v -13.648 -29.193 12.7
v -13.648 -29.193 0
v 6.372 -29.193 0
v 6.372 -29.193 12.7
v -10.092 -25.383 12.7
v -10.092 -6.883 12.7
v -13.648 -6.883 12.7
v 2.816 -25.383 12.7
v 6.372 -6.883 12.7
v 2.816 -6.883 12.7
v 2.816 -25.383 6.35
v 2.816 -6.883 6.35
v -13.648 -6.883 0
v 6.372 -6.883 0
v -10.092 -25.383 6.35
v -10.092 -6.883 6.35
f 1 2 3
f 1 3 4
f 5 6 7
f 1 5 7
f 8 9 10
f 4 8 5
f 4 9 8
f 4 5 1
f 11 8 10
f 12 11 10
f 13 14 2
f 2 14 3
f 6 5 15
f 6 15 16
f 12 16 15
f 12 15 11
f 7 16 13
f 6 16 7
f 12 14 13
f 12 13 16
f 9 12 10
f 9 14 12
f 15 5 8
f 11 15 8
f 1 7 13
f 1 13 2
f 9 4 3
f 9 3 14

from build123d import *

# Parameters (mm, degrees)
F0_W     = 12.4
F0_H     = 18.5
F1_DEPTH = 6.35
F2_W     = 12.4
F2_H     = 12.7
F3_DEPTH = 3.81
F4_W     = 22.31
F4_H     = 12.7
F5_DEPTH = 3.81
F6_W     = 22.31
F6_H     = 12.7
F7_DEPTH = 3.81
F8_W     = 12.908
F8_H     = 18.5
F9_DEPTH = 6.35


with BuildPart() as f1:
    # F0 (on Top) → F1 (new body)
    with BuildSketch(Plane.XY):
        with Locations((-3.637616, -16.132845)):
            Rectangle(F0_W, F0_H)
    extrude(amount=F1_DEPTH)

    # F2 (on face) → F3 (join)
    with BuildSketch(Plane.XZ.offset(25.382845)):
        with Locations((-3.637616, 6.35)):
            Rectangle(F2_W, F2_H)
    extrude(amount=F3_DEPTH)

    # F4 (on face) → F5 (join)
    with BuildSketch(Plane.YZ.offset(2.562384)):
        with Locations((-18.037845, 6.35)):
            Rectangle(F4_W, F4_H)
    extrude(amount=F5_DEPTH)

    # F6 (on face) → F7 (join)
    with BuildSketch(Plane(origin=(-9.837616, 0, 0), x_dir=(0, -1, 0), z_dir=(-1, 0, 0))):
        with Locations((18.037845, 6.35)):
            Rectangle(F6_W, F6_H)
    extrude(amount=F7_DEPTH)

    # F8 (on face) → F9 (cut, through all)
    with BuildSketch(Plane.XY.offset(12.7)):
        with Locations((-3.637616, -16.132845)):
            Rectangle(F8_W, F8_H)
    extrude(amount=-F9_DEPTH, mode=Mode.SUBTRACT)


solid = f1.part
